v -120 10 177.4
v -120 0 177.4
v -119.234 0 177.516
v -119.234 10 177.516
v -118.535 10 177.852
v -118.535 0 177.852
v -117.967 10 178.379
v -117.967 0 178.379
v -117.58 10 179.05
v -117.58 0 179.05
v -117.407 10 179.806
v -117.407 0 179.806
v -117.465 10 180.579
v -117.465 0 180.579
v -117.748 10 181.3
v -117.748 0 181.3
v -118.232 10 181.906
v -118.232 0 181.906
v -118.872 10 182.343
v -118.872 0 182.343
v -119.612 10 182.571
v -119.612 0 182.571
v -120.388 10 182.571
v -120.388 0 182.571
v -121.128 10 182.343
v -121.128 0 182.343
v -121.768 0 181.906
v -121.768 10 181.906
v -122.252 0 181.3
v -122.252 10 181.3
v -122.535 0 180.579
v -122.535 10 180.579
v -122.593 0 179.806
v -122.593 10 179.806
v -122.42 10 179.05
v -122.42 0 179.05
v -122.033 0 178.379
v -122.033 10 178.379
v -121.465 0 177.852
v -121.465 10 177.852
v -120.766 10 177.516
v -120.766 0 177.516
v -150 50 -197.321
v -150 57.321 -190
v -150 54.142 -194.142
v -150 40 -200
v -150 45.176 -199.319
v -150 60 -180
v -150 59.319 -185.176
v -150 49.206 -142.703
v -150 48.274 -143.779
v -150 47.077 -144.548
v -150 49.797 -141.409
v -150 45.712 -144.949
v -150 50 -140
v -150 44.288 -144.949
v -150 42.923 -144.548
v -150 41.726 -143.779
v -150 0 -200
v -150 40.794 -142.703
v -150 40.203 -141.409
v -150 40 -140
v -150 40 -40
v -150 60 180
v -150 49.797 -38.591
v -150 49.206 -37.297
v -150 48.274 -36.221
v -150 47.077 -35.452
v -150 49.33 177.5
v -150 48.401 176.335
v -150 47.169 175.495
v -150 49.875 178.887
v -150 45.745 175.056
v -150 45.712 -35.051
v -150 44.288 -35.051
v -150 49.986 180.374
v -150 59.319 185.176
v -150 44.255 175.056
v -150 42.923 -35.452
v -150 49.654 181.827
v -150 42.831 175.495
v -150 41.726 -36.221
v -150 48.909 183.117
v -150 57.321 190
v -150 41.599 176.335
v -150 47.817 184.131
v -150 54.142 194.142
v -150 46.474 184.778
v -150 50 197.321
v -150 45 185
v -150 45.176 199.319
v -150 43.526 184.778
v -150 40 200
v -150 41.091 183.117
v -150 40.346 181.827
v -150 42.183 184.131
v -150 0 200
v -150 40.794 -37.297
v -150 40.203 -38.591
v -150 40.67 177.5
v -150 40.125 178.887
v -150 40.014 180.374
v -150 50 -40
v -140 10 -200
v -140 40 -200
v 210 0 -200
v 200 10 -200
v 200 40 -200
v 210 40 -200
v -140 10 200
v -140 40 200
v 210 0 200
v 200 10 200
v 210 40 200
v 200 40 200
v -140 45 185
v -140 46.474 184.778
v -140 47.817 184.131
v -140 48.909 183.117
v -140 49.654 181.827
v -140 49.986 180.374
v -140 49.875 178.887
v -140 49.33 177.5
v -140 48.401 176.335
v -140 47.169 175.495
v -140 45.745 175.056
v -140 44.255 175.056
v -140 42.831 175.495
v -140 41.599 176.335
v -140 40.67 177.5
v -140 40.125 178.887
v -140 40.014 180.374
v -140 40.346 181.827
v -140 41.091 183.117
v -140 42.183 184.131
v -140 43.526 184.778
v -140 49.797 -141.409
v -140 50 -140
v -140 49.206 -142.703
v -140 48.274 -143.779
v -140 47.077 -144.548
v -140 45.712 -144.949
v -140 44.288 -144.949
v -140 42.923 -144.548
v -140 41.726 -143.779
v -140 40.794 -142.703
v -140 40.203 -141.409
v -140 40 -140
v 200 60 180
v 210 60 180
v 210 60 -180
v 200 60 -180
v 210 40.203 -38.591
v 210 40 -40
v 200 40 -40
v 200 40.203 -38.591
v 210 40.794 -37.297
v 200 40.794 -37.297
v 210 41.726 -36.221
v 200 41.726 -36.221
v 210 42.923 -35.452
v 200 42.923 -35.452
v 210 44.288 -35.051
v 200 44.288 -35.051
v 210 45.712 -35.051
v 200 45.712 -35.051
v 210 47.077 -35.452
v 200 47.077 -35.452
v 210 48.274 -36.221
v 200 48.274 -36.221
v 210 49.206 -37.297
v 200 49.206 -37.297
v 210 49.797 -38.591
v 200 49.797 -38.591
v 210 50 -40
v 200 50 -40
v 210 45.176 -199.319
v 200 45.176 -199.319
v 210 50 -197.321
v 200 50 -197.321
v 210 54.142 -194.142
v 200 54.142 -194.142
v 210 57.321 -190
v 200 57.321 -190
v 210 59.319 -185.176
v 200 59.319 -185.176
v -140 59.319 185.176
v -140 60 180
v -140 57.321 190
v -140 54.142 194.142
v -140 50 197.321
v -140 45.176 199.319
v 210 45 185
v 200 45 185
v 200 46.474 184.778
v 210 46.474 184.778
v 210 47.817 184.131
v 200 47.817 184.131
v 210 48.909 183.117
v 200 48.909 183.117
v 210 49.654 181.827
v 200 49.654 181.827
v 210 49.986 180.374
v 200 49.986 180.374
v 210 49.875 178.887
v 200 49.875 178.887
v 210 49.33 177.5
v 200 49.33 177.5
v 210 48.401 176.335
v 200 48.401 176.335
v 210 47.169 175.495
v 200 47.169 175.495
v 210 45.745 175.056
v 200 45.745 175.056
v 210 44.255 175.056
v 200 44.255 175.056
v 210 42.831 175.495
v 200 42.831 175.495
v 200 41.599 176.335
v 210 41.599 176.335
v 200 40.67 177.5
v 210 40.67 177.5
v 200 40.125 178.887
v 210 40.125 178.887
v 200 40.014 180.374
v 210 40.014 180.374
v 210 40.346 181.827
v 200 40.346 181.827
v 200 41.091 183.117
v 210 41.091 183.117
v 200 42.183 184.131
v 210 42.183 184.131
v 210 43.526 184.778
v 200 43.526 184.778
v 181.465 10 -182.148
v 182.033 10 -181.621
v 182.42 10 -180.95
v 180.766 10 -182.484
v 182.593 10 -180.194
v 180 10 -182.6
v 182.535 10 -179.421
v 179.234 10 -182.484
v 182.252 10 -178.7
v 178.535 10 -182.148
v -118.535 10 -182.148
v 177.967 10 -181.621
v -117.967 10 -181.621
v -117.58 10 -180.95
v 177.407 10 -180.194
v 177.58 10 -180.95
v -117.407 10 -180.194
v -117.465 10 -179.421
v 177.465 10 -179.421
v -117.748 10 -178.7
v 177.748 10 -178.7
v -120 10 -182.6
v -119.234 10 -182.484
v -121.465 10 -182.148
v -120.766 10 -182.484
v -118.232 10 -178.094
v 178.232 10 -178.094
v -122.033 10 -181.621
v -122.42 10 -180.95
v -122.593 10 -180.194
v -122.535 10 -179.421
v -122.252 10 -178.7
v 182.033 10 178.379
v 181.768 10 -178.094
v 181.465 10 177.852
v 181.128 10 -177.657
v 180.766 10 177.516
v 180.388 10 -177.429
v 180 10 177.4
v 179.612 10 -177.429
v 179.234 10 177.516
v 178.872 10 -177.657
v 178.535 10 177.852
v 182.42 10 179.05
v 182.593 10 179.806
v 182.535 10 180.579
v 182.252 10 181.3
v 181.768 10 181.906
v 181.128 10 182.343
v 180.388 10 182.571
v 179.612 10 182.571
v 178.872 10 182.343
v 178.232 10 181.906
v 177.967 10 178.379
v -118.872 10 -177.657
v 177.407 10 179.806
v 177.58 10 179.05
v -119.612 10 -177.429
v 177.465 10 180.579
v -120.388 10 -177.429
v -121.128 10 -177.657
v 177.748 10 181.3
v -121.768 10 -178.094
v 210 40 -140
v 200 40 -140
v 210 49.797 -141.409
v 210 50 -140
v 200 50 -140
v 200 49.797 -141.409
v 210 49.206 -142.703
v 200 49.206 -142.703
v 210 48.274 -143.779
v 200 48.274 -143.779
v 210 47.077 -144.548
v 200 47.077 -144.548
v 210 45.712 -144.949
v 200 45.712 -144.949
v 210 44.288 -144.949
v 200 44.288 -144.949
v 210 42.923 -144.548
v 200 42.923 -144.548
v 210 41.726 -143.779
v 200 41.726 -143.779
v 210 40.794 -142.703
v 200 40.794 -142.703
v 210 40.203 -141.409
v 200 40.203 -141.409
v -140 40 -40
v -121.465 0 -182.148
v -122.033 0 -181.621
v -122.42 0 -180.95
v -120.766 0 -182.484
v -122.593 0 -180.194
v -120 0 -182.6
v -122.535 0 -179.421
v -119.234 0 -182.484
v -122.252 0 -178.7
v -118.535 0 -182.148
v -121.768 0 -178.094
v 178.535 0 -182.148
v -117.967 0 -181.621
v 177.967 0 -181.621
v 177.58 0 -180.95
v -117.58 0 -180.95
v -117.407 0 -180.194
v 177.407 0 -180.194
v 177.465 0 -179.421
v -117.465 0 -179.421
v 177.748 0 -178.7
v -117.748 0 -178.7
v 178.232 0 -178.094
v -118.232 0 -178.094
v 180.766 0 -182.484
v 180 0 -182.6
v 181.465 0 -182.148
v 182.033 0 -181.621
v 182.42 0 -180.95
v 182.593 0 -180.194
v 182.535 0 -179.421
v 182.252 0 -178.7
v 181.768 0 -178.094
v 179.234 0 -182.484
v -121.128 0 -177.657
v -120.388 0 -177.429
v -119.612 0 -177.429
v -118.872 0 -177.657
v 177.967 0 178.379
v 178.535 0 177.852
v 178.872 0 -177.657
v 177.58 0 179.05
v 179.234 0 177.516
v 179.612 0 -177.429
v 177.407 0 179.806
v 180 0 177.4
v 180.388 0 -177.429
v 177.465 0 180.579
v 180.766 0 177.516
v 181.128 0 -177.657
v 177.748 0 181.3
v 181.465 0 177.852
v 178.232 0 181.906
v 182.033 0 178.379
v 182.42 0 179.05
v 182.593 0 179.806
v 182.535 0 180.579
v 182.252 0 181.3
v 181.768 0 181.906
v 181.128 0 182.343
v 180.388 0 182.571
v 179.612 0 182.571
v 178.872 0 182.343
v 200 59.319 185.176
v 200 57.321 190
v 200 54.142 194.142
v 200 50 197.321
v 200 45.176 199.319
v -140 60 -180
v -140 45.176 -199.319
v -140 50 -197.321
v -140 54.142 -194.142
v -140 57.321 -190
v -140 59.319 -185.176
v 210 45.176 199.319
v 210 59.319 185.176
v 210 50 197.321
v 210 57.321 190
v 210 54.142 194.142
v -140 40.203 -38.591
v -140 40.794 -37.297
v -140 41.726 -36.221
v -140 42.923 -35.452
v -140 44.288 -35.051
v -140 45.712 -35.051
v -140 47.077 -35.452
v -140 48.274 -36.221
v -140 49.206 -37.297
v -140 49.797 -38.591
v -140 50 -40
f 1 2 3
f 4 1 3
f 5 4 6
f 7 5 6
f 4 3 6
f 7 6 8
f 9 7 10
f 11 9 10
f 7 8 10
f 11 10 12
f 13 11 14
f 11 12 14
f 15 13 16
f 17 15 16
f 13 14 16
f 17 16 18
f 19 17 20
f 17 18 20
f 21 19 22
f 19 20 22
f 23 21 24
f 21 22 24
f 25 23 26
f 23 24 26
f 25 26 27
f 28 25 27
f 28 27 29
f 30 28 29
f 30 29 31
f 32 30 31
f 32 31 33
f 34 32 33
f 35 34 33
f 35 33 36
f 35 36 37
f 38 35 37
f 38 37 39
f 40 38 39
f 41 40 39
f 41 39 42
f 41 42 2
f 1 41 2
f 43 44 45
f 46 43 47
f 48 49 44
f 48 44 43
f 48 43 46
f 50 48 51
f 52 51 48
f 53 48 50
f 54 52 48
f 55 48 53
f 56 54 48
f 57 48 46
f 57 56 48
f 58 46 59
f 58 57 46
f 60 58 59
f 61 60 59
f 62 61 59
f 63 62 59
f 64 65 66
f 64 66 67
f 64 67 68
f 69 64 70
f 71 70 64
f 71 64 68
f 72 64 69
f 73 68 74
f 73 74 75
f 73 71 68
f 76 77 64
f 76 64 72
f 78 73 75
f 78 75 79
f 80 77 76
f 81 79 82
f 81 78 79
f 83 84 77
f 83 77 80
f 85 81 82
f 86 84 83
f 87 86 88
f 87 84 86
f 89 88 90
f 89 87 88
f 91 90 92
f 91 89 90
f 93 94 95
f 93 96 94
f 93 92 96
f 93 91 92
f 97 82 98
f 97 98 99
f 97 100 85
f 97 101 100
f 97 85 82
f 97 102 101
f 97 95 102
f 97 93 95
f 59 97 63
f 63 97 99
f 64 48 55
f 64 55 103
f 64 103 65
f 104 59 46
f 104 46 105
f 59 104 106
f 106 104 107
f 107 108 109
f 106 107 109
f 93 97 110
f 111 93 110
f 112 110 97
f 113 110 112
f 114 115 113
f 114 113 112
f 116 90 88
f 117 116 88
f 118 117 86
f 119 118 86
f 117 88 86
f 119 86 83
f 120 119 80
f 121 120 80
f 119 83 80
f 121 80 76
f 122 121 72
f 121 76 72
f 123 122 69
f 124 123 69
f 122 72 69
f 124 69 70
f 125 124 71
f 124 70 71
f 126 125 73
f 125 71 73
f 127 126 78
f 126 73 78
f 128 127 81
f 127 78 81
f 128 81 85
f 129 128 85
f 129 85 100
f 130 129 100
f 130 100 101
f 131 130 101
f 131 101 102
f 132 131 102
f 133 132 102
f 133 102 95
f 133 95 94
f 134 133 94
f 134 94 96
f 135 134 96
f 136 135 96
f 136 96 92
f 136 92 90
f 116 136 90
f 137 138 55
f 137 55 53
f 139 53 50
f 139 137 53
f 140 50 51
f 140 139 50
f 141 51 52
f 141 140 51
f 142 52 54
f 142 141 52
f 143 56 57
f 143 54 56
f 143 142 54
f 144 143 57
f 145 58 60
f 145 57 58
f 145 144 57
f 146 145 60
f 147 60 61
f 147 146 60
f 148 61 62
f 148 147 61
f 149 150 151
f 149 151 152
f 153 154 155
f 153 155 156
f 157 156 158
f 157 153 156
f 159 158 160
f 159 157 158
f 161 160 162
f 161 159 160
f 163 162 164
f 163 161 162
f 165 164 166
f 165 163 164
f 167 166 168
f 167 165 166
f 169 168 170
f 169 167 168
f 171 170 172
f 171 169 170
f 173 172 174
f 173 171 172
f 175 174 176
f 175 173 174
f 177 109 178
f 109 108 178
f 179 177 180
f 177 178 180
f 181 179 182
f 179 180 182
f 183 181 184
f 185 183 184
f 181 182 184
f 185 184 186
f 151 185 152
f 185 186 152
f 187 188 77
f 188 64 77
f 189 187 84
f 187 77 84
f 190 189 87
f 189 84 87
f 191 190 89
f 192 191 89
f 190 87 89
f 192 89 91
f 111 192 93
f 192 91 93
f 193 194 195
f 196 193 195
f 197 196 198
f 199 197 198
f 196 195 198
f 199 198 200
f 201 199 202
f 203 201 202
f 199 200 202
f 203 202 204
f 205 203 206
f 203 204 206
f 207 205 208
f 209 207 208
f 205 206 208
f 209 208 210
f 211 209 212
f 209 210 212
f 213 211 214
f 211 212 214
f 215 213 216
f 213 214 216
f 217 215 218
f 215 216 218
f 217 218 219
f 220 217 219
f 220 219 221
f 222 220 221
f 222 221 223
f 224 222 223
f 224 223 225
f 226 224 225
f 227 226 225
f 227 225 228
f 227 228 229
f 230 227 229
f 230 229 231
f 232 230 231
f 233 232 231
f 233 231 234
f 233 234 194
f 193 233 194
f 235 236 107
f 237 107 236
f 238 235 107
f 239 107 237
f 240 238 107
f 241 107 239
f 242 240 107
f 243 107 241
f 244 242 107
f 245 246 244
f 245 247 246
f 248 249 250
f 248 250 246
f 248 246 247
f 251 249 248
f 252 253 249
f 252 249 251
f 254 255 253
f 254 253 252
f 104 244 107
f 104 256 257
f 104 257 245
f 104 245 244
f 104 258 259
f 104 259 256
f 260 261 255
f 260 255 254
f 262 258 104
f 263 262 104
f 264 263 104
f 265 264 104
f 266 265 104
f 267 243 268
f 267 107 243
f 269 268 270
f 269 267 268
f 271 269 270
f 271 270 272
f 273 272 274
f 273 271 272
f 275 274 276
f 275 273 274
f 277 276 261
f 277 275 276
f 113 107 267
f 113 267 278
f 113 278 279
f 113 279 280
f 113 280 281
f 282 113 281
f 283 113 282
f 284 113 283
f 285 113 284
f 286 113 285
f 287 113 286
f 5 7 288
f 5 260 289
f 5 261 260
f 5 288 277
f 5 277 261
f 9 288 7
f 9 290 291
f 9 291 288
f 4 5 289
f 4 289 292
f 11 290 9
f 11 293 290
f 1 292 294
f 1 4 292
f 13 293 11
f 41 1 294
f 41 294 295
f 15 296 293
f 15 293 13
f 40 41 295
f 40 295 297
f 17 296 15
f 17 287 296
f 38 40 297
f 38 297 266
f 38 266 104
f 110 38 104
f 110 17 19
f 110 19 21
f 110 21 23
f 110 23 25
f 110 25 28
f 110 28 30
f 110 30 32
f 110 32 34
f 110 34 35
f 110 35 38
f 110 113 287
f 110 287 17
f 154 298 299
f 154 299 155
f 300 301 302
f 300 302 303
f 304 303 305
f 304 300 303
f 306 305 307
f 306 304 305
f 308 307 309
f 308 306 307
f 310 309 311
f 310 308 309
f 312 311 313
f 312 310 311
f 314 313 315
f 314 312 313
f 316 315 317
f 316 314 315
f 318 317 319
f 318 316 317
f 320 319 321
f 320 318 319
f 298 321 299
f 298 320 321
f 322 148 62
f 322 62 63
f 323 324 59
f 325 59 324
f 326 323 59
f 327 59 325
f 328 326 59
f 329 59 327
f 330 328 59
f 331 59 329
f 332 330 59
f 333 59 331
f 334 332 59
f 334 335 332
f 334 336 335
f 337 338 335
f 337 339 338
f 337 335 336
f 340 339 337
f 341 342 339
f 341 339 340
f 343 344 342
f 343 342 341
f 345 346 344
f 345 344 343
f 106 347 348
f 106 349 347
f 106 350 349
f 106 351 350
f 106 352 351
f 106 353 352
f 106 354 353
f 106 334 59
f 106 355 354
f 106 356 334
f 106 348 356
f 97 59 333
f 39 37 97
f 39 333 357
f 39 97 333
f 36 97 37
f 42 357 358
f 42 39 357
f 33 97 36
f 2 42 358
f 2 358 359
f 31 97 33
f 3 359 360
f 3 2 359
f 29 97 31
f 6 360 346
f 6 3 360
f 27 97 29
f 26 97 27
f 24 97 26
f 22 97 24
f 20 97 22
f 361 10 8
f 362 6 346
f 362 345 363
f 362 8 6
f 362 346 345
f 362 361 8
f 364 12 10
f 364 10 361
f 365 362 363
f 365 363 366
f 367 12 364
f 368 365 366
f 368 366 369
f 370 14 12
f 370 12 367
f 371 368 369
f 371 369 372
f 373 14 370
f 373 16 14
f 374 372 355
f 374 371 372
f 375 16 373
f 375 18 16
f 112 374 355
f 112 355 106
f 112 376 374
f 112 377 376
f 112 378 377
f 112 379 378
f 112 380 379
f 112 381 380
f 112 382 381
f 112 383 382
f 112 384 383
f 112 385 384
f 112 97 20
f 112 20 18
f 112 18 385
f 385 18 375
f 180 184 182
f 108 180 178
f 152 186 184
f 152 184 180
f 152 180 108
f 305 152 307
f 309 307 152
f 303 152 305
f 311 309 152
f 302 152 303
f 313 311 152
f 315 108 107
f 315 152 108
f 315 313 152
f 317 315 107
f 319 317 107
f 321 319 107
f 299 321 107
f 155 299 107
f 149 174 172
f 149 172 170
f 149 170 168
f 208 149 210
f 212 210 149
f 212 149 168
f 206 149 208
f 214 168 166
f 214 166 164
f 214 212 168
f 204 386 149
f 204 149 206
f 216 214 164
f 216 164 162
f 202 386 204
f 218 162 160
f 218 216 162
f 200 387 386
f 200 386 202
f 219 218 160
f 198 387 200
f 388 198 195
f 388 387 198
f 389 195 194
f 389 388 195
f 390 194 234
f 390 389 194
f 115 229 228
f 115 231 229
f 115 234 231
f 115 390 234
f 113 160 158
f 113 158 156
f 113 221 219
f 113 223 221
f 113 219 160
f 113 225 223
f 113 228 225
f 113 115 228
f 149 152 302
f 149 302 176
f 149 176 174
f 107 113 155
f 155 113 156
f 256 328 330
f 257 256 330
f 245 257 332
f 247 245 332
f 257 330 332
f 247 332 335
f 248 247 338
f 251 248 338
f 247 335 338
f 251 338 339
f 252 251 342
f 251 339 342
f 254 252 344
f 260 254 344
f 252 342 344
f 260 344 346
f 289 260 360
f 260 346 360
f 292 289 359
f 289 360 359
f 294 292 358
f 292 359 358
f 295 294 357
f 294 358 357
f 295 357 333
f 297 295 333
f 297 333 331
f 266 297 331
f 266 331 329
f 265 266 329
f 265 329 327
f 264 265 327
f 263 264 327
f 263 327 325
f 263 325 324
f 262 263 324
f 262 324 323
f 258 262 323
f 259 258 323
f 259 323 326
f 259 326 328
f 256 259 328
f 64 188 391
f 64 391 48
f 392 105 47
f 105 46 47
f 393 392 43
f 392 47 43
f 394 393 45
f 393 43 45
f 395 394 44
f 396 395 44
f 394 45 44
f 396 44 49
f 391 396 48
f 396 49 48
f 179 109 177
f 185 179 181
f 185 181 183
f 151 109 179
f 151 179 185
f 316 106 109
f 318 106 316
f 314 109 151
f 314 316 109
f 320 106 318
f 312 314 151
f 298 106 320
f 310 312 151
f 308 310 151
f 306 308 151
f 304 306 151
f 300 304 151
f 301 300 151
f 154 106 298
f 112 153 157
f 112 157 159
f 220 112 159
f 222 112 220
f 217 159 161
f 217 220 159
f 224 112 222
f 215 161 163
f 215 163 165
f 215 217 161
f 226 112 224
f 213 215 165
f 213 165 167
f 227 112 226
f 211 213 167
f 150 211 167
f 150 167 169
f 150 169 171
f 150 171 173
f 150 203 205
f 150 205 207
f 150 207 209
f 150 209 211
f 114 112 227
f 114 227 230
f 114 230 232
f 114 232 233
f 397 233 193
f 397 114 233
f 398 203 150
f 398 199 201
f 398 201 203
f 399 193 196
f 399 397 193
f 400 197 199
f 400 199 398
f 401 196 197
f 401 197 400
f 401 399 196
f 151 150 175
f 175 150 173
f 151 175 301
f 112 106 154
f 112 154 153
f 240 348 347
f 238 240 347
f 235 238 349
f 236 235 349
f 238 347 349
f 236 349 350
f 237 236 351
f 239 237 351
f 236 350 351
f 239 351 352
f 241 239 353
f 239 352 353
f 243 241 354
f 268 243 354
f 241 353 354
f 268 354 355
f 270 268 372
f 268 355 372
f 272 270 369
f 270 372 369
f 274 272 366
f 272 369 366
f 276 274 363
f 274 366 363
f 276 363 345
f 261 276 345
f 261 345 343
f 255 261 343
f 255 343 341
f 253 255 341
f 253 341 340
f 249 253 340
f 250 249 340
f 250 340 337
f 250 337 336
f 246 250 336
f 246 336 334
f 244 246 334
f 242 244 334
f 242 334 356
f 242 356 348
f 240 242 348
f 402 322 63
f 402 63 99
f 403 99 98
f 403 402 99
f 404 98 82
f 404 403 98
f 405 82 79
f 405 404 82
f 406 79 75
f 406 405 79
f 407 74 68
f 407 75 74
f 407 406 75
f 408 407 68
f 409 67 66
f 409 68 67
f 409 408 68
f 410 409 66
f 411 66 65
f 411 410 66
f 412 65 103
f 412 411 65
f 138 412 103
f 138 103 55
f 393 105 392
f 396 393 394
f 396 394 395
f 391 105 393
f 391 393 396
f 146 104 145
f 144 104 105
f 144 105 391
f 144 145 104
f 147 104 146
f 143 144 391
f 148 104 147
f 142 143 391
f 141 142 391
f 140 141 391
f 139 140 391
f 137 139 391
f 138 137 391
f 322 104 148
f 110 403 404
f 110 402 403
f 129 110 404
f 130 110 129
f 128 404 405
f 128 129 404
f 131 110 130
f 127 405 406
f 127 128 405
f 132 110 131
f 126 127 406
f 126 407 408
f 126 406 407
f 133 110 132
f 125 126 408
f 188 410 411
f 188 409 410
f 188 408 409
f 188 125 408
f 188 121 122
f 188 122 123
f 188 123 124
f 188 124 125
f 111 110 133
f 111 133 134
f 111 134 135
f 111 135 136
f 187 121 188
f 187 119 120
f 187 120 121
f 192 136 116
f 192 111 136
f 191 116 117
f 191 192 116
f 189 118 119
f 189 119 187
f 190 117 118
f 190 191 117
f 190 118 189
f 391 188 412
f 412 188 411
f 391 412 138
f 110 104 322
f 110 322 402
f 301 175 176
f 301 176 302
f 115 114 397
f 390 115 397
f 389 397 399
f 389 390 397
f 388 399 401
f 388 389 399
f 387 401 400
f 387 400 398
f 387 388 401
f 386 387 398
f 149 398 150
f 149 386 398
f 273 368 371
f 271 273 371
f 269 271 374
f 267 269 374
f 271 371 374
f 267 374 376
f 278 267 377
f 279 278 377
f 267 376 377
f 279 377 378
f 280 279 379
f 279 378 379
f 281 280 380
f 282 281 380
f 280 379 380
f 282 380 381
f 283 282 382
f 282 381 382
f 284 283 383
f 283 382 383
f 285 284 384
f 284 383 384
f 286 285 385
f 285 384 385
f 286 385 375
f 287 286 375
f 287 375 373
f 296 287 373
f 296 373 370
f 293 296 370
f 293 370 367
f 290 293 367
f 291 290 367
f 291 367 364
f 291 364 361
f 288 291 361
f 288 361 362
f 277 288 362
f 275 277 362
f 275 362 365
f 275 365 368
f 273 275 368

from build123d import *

# Parameters (mm, degrees)
EXTRUDE_THIN1_DEPTH                      = 200
CUT_EXTRUDE1_DEPTH                       = 364
SKETCH3_R                                = 5
CUT_EXTRUDE2_DEPTH                       = 417.173040934
RADYUS1_R                                = 20
M5_HELISARMAL_I_IN_Z_VANA_MATKAB_1_D     = 5.2
M5_HELISARMAL_I_IN_Z_VANA_MATKAB_1_DEPTH = 12
M5_HELISARMAL_I_IN_Z_VANA_MATKAB_1_TIP   = 1.562237609


with BuildPart() as part:
    # Sketch1 → Extrude-Thin1 (new, symmetric)
    with BuildSketch(Plane.XY):
        Polygon((-150, 60), (-150, 0), (210, 0), (210, 60), (200, 60), (200, 10), (-140, 10), (-140, 60), align=None)
    extrude(amount=EXTRUDE_THIN1_DEPTH, both=True)

    # Sketch2 → Cut-Extrude1 (cut)
    with BuildSketch(Plane(origin=(210, 0, 0), x_dir=(0, 0, -1), z_dir=(1, 0, 0))):
        with BuildLine():
            Line((40, 50), (140, 50))
            ThreePointArc((140, 50), (145, 45), (140, 40))
            Line((140, 40), (40, 40))
            ThreePointArc((40, 40), (35, 45), (40, 50))
        make_face()
    extrude(amount=-CUT_EXTRUDE1_DEPTH, mode=Mode.SUBTRACT)

    # Sketch3 → Cut-Extrude2 (cut, through all)
    with BuildSketch(Plane.ZY.offset(150)):
        with Locations((180, 45)):
            Circle(SKETCH3_R)
    extrude(amount=-CUT_EXTRUDE2_DEPTH, mode=Mode.SUBTRACT)

    # Radyus1
    radyus1_edges = [part.edges().sort_by_distance(p)[0] for p in [
        (205, 60, 200),
        (-145, 60, 200),
        (205, 60, -200),
        (-145, 60, -200),
    ]]
    fillet(radyus1_edges, radius=RADYUS1_R)

    # M5 Helisarmal için Zıvana matkabı1
    with Locations(Plane(origin=(-120, 10, 180), x_dir=(0, 0, 1), z_dir=(0, 1, 0))):
        with Locations((0, 0), (0, 300), (-360, 300), (-360, 0)):
            Hole(M5_HELISARMAL_I_IN_Z_VANA_MATKAB_1_D / 2, depth=M5_HELISARMAL_I_IN_Z_VANA_MATKAB_1_DEPTH)
            with Locations((0, 0, -(M5_HELISARMAL_I_IN_Z_VANA_MATKAB_1_DEPTH + M5_HELISARMAL_I_IN_Z_VANA_MATKAB_1_TIP / 2))):  # 118° drill point
                Cone(0, M5_HELISARMAL_I_IN_Z_VANA_MATKAB_1_D / 2, M5_HELISARMAL_I_IN_Z_VANA_MATKAB_1_TIP, mode=Mode.SUBTRACT)


solid = part.part
